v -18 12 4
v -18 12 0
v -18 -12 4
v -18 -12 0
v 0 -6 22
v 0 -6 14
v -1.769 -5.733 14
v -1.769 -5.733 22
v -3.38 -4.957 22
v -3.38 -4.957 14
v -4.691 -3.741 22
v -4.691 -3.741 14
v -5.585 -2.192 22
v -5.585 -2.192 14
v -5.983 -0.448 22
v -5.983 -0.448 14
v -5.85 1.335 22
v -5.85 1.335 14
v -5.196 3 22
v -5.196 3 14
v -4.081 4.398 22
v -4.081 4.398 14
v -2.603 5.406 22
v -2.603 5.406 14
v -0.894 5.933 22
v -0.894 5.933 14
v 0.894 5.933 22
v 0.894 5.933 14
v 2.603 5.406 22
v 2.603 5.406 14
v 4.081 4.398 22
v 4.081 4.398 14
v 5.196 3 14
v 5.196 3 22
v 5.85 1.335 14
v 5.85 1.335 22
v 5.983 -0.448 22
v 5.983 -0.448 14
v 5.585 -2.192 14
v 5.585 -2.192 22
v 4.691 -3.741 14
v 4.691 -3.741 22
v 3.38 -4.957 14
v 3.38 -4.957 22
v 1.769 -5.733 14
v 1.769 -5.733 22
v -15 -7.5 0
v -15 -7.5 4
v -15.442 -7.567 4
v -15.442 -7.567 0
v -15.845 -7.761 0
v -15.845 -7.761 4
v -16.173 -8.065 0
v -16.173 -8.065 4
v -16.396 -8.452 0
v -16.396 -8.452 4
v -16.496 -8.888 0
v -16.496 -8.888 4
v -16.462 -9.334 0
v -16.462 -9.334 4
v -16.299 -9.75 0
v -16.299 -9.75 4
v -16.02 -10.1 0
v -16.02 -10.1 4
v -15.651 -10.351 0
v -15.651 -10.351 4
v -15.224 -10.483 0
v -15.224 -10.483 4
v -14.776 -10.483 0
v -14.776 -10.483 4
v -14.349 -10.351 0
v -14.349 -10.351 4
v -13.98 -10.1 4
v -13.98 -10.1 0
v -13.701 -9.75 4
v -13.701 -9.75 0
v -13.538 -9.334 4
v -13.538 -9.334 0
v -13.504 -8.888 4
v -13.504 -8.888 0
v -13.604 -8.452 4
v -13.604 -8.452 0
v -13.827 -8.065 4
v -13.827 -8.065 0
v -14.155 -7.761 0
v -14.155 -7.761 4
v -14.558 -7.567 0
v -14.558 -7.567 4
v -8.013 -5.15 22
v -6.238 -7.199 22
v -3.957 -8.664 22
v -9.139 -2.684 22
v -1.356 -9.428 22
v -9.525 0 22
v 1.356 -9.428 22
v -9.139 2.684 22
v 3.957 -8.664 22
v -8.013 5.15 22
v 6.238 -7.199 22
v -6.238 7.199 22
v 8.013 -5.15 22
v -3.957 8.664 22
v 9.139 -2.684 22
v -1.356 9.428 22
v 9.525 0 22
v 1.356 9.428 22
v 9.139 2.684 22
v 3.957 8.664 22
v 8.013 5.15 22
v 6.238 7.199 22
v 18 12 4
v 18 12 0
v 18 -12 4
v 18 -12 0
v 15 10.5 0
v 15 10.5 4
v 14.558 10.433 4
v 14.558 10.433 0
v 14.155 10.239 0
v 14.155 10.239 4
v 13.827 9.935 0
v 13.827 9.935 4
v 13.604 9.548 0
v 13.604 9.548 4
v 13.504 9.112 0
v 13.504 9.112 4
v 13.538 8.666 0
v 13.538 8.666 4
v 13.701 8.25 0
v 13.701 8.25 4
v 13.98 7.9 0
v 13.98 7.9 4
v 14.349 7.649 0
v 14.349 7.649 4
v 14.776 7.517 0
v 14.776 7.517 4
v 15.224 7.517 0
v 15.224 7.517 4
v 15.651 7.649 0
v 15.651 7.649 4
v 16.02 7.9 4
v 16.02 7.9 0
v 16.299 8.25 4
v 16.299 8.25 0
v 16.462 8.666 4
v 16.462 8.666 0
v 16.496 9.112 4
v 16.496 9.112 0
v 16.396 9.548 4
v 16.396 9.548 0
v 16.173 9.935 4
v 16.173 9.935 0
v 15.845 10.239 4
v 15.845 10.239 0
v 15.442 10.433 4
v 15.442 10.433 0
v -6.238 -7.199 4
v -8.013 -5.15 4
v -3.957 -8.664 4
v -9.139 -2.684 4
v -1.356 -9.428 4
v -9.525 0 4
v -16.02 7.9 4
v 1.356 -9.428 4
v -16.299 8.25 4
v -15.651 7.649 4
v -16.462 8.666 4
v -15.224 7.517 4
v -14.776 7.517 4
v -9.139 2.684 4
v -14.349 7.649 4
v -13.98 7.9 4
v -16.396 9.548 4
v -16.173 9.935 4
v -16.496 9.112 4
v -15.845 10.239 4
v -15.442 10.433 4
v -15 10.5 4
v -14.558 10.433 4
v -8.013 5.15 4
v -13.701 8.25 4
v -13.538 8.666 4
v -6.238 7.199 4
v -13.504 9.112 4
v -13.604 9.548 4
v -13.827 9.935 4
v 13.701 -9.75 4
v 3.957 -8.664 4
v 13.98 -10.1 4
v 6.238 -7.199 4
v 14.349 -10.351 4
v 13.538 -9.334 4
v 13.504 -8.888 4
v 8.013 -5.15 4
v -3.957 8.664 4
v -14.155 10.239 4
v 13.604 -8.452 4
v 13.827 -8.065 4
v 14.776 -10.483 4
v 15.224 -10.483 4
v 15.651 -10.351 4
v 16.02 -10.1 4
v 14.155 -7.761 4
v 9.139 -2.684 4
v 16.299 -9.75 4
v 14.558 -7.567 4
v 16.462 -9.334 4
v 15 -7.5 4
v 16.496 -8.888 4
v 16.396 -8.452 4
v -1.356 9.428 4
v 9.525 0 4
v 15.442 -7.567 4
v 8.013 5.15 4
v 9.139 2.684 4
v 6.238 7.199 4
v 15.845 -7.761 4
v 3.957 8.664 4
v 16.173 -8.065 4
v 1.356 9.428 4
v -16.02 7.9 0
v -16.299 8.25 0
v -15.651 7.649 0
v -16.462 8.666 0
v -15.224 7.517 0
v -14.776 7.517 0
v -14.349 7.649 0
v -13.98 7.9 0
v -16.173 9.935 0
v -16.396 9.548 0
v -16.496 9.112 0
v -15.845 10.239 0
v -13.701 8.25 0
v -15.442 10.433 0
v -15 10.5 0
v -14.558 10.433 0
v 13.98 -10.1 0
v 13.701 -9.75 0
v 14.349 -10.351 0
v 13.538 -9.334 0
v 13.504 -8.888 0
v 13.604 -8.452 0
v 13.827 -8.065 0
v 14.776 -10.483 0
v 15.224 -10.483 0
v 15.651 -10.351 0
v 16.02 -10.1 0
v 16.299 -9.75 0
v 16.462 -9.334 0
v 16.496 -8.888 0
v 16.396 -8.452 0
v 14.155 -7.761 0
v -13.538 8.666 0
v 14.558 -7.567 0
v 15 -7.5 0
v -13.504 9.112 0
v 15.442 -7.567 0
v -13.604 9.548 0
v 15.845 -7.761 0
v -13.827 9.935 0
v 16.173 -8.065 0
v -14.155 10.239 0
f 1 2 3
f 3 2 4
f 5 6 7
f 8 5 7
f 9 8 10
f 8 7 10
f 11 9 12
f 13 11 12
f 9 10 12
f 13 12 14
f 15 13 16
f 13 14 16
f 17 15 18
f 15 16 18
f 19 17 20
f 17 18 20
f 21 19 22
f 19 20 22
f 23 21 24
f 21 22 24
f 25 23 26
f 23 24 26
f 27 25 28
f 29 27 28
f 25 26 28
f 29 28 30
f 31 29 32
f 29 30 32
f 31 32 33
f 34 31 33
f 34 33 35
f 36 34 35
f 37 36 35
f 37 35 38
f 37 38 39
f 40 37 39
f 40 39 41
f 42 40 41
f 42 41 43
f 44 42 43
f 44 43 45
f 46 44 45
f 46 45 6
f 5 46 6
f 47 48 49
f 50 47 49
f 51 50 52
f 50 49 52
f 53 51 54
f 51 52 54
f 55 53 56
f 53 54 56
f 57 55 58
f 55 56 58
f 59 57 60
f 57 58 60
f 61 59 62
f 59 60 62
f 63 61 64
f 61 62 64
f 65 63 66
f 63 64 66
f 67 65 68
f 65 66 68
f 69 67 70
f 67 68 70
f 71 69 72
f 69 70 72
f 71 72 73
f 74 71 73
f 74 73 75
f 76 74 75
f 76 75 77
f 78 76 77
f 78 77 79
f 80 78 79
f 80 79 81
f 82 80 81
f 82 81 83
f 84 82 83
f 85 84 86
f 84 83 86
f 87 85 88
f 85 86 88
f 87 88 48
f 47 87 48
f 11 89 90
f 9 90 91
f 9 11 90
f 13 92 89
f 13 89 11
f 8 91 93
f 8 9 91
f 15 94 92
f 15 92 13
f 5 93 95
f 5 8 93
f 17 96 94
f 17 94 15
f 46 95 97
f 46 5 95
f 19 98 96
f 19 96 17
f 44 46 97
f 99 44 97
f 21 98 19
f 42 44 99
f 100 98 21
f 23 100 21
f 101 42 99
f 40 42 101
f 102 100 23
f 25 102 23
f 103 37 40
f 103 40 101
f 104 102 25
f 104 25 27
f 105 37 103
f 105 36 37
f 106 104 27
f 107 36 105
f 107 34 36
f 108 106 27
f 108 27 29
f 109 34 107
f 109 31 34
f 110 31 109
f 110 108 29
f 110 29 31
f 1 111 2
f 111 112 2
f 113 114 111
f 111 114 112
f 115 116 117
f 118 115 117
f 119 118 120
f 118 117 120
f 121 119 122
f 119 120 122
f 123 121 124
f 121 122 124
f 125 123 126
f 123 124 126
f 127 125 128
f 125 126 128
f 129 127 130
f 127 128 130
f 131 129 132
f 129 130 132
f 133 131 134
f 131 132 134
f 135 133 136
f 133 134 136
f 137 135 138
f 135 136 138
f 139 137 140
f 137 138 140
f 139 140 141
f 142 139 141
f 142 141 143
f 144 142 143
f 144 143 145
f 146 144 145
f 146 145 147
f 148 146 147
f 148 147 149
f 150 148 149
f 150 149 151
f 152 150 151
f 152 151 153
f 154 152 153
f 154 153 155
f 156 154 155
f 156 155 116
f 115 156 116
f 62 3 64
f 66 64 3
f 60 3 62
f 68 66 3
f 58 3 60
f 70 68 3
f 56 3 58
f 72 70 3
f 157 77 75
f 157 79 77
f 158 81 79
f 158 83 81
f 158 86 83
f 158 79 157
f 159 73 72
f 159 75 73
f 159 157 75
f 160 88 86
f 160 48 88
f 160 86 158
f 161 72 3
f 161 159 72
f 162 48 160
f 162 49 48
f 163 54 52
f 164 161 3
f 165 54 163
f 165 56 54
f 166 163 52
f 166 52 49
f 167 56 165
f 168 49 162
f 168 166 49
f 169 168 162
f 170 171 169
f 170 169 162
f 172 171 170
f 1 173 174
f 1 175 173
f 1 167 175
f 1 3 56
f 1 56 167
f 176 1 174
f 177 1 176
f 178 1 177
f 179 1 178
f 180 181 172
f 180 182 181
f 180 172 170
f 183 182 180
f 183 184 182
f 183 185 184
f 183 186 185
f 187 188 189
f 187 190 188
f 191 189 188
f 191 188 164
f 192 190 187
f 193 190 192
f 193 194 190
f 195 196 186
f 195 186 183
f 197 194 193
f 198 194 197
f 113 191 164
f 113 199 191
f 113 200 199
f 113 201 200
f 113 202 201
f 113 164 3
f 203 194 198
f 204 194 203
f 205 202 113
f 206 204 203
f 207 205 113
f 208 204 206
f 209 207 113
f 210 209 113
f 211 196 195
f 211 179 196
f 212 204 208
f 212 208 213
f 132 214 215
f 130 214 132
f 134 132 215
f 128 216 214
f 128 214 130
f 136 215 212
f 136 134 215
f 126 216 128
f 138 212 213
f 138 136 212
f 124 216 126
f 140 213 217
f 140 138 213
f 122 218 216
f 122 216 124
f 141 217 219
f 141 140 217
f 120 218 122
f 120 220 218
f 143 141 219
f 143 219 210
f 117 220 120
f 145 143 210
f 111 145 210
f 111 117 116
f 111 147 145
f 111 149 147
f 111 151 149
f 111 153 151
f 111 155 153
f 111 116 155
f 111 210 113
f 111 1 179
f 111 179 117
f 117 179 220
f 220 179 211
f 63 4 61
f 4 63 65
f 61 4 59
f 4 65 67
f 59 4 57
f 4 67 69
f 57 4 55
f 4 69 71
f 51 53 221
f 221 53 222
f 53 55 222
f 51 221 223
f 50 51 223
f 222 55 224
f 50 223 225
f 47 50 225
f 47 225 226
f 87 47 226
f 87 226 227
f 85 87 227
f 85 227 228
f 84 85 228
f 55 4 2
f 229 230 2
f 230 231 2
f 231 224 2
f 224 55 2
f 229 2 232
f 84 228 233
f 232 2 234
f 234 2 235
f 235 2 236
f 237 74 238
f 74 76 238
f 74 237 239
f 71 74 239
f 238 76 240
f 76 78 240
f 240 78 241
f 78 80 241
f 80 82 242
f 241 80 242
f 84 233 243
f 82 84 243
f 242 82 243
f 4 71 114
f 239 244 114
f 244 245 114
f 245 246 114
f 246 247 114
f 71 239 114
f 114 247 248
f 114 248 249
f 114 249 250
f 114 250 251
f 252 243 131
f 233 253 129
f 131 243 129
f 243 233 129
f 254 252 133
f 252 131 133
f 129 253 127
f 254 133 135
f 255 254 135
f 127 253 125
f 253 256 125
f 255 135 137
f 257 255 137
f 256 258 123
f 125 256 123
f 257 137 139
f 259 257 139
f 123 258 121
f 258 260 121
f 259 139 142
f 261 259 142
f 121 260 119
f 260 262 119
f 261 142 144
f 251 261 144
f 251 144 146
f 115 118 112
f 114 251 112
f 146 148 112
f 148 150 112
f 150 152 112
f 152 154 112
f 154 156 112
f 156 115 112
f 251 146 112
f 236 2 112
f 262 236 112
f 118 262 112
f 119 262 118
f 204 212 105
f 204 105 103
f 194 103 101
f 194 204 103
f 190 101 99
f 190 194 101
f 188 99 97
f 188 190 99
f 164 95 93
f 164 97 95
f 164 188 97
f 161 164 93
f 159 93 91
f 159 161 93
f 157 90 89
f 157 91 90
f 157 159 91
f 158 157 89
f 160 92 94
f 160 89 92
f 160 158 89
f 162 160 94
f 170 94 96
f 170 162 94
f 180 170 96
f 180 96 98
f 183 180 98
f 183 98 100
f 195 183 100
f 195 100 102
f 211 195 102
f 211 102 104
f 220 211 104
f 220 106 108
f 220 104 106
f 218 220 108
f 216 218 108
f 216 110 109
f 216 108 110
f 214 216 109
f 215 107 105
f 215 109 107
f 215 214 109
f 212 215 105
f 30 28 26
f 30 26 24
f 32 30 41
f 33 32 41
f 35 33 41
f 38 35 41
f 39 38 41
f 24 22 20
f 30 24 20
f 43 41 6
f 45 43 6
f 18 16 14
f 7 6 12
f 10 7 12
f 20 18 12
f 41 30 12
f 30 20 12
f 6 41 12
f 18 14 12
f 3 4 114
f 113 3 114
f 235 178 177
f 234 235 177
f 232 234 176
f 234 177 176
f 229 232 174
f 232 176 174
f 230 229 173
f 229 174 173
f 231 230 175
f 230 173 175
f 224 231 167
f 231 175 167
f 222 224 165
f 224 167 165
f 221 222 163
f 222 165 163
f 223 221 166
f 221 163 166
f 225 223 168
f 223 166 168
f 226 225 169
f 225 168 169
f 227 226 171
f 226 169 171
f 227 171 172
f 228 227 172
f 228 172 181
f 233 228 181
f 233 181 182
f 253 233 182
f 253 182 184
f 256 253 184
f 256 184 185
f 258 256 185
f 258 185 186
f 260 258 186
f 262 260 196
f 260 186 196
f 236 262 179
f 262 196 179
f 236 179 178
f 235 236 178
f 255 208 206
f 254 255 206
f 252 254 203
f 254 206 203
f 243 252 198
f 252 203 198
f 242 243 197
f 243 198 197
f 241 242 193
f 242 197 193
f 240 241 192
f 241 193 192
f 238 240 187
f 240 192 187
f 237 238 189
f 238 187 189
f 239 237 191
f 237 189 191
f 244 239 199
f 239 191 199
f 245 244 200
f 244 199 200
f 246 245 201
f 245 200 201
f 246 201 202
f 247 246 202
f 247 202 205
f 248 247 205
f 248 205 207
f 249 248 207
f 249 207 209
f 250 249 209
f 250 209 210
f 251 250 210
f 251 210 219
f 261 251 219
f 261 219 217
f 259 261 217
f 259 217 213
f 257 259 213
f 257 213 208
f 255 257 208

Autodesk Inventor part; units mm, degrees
ref_plane "YZ Plane" through (0, 0, 0) normal (1, 0, 0) x (0, 1, 0)
ref_plane "XZ Plane" through (0, 0, 0) normal (0, 1, 0) x (-1, 0, 0)
ref_plane "XY Plane" through (0, 0, 0) normal (0, 0, 1) x (1, 0, 0)
sketch "Boceto1" plane through (0, 0, 0) normal (0, 0, 1) x (1, 0, 0)
  line L0 (-18, -12) -> (18, -12)
  line L1 (18, -12) -> (18, 12)
  line L2 (18, 12) -> (-18, 12)
  line L3 (-18, 12) -> (-18, -12)
  line L4 (-18, -12) -> (18, 12) construction
  line L5 (18, -12) -> (-18, 12) construction
  circle A0 centre (0, 0) radius 9.525
  line L6 (-15, -9) -> (15, -9)
  line L7 (15, -9) -> (15, 9)
  line L8 (15, 9) -> (-15, 9)
  line L9 (-15, 9) -> (-15, -9)
  line L10 (-15, -9) -> (15, 9) construction
  line L11 (15, -9) -> (-15, 9) construction
  dimension "d0" = 36
  dimension "d1" = 24
  dimension "d2" = 19.05
  dimension "d3" = 30
  dimension "d4" = 18
extrude "Extrusión1" add sketch "Boceto1" along normal blind 4 contours L3 L2 L1 L0 | A0 L6 L8 | A0 L8 L7 L6 | L8 A0 | A0 L6 | A0 L6 L9 L8
sketch "Boceto2" plane through (0, 0, 4) normal (0, 0, 1) x (1, 0, 0)
  circle A0 centre (0, 0) radius 9.525
  dimension "d7" = 19.05
extrude "Extrusión2" add sketch "Boceto2" along normal blind 18
sketch "Boceto3" plane through (0, 0, 22) normal (0, 0, 1) x (1, 0, 0)
  point P0 (0, 0)
  point P1 (0, 0)
hole "Agujero1" at (0, 0, 22) direction (0, 0, -1) diameter 12 depth 8
sketch "Boceto4" plane through (0, 0, 0) normal (0, 0, -1) x (-1, 0, 0)
  line L0 (15, -9) -> (-15, -9)
  line L1 (-15, -9) -> (-15, 9)
  line L2 (-15, 9) -> (15, 9)
  line L3 (15, 9) -> (15, -9)
  line L4 (15, -9) -> (-15, 9) construction
  line L5 (-15, -9) -> (15, 9) construction
  point P0 (0, 0)
  dimension "d17" = 30
  dimension "d18" = 18
hole "Agujero2" at (15, 9, 0) at (15, -9, 0) at (-15, 9, 0) at (-15, -9, 0) direction (0, 0, 1) diameter 3 depth 8 tip angle 118
properties part number "SoporteVarillaZ"
